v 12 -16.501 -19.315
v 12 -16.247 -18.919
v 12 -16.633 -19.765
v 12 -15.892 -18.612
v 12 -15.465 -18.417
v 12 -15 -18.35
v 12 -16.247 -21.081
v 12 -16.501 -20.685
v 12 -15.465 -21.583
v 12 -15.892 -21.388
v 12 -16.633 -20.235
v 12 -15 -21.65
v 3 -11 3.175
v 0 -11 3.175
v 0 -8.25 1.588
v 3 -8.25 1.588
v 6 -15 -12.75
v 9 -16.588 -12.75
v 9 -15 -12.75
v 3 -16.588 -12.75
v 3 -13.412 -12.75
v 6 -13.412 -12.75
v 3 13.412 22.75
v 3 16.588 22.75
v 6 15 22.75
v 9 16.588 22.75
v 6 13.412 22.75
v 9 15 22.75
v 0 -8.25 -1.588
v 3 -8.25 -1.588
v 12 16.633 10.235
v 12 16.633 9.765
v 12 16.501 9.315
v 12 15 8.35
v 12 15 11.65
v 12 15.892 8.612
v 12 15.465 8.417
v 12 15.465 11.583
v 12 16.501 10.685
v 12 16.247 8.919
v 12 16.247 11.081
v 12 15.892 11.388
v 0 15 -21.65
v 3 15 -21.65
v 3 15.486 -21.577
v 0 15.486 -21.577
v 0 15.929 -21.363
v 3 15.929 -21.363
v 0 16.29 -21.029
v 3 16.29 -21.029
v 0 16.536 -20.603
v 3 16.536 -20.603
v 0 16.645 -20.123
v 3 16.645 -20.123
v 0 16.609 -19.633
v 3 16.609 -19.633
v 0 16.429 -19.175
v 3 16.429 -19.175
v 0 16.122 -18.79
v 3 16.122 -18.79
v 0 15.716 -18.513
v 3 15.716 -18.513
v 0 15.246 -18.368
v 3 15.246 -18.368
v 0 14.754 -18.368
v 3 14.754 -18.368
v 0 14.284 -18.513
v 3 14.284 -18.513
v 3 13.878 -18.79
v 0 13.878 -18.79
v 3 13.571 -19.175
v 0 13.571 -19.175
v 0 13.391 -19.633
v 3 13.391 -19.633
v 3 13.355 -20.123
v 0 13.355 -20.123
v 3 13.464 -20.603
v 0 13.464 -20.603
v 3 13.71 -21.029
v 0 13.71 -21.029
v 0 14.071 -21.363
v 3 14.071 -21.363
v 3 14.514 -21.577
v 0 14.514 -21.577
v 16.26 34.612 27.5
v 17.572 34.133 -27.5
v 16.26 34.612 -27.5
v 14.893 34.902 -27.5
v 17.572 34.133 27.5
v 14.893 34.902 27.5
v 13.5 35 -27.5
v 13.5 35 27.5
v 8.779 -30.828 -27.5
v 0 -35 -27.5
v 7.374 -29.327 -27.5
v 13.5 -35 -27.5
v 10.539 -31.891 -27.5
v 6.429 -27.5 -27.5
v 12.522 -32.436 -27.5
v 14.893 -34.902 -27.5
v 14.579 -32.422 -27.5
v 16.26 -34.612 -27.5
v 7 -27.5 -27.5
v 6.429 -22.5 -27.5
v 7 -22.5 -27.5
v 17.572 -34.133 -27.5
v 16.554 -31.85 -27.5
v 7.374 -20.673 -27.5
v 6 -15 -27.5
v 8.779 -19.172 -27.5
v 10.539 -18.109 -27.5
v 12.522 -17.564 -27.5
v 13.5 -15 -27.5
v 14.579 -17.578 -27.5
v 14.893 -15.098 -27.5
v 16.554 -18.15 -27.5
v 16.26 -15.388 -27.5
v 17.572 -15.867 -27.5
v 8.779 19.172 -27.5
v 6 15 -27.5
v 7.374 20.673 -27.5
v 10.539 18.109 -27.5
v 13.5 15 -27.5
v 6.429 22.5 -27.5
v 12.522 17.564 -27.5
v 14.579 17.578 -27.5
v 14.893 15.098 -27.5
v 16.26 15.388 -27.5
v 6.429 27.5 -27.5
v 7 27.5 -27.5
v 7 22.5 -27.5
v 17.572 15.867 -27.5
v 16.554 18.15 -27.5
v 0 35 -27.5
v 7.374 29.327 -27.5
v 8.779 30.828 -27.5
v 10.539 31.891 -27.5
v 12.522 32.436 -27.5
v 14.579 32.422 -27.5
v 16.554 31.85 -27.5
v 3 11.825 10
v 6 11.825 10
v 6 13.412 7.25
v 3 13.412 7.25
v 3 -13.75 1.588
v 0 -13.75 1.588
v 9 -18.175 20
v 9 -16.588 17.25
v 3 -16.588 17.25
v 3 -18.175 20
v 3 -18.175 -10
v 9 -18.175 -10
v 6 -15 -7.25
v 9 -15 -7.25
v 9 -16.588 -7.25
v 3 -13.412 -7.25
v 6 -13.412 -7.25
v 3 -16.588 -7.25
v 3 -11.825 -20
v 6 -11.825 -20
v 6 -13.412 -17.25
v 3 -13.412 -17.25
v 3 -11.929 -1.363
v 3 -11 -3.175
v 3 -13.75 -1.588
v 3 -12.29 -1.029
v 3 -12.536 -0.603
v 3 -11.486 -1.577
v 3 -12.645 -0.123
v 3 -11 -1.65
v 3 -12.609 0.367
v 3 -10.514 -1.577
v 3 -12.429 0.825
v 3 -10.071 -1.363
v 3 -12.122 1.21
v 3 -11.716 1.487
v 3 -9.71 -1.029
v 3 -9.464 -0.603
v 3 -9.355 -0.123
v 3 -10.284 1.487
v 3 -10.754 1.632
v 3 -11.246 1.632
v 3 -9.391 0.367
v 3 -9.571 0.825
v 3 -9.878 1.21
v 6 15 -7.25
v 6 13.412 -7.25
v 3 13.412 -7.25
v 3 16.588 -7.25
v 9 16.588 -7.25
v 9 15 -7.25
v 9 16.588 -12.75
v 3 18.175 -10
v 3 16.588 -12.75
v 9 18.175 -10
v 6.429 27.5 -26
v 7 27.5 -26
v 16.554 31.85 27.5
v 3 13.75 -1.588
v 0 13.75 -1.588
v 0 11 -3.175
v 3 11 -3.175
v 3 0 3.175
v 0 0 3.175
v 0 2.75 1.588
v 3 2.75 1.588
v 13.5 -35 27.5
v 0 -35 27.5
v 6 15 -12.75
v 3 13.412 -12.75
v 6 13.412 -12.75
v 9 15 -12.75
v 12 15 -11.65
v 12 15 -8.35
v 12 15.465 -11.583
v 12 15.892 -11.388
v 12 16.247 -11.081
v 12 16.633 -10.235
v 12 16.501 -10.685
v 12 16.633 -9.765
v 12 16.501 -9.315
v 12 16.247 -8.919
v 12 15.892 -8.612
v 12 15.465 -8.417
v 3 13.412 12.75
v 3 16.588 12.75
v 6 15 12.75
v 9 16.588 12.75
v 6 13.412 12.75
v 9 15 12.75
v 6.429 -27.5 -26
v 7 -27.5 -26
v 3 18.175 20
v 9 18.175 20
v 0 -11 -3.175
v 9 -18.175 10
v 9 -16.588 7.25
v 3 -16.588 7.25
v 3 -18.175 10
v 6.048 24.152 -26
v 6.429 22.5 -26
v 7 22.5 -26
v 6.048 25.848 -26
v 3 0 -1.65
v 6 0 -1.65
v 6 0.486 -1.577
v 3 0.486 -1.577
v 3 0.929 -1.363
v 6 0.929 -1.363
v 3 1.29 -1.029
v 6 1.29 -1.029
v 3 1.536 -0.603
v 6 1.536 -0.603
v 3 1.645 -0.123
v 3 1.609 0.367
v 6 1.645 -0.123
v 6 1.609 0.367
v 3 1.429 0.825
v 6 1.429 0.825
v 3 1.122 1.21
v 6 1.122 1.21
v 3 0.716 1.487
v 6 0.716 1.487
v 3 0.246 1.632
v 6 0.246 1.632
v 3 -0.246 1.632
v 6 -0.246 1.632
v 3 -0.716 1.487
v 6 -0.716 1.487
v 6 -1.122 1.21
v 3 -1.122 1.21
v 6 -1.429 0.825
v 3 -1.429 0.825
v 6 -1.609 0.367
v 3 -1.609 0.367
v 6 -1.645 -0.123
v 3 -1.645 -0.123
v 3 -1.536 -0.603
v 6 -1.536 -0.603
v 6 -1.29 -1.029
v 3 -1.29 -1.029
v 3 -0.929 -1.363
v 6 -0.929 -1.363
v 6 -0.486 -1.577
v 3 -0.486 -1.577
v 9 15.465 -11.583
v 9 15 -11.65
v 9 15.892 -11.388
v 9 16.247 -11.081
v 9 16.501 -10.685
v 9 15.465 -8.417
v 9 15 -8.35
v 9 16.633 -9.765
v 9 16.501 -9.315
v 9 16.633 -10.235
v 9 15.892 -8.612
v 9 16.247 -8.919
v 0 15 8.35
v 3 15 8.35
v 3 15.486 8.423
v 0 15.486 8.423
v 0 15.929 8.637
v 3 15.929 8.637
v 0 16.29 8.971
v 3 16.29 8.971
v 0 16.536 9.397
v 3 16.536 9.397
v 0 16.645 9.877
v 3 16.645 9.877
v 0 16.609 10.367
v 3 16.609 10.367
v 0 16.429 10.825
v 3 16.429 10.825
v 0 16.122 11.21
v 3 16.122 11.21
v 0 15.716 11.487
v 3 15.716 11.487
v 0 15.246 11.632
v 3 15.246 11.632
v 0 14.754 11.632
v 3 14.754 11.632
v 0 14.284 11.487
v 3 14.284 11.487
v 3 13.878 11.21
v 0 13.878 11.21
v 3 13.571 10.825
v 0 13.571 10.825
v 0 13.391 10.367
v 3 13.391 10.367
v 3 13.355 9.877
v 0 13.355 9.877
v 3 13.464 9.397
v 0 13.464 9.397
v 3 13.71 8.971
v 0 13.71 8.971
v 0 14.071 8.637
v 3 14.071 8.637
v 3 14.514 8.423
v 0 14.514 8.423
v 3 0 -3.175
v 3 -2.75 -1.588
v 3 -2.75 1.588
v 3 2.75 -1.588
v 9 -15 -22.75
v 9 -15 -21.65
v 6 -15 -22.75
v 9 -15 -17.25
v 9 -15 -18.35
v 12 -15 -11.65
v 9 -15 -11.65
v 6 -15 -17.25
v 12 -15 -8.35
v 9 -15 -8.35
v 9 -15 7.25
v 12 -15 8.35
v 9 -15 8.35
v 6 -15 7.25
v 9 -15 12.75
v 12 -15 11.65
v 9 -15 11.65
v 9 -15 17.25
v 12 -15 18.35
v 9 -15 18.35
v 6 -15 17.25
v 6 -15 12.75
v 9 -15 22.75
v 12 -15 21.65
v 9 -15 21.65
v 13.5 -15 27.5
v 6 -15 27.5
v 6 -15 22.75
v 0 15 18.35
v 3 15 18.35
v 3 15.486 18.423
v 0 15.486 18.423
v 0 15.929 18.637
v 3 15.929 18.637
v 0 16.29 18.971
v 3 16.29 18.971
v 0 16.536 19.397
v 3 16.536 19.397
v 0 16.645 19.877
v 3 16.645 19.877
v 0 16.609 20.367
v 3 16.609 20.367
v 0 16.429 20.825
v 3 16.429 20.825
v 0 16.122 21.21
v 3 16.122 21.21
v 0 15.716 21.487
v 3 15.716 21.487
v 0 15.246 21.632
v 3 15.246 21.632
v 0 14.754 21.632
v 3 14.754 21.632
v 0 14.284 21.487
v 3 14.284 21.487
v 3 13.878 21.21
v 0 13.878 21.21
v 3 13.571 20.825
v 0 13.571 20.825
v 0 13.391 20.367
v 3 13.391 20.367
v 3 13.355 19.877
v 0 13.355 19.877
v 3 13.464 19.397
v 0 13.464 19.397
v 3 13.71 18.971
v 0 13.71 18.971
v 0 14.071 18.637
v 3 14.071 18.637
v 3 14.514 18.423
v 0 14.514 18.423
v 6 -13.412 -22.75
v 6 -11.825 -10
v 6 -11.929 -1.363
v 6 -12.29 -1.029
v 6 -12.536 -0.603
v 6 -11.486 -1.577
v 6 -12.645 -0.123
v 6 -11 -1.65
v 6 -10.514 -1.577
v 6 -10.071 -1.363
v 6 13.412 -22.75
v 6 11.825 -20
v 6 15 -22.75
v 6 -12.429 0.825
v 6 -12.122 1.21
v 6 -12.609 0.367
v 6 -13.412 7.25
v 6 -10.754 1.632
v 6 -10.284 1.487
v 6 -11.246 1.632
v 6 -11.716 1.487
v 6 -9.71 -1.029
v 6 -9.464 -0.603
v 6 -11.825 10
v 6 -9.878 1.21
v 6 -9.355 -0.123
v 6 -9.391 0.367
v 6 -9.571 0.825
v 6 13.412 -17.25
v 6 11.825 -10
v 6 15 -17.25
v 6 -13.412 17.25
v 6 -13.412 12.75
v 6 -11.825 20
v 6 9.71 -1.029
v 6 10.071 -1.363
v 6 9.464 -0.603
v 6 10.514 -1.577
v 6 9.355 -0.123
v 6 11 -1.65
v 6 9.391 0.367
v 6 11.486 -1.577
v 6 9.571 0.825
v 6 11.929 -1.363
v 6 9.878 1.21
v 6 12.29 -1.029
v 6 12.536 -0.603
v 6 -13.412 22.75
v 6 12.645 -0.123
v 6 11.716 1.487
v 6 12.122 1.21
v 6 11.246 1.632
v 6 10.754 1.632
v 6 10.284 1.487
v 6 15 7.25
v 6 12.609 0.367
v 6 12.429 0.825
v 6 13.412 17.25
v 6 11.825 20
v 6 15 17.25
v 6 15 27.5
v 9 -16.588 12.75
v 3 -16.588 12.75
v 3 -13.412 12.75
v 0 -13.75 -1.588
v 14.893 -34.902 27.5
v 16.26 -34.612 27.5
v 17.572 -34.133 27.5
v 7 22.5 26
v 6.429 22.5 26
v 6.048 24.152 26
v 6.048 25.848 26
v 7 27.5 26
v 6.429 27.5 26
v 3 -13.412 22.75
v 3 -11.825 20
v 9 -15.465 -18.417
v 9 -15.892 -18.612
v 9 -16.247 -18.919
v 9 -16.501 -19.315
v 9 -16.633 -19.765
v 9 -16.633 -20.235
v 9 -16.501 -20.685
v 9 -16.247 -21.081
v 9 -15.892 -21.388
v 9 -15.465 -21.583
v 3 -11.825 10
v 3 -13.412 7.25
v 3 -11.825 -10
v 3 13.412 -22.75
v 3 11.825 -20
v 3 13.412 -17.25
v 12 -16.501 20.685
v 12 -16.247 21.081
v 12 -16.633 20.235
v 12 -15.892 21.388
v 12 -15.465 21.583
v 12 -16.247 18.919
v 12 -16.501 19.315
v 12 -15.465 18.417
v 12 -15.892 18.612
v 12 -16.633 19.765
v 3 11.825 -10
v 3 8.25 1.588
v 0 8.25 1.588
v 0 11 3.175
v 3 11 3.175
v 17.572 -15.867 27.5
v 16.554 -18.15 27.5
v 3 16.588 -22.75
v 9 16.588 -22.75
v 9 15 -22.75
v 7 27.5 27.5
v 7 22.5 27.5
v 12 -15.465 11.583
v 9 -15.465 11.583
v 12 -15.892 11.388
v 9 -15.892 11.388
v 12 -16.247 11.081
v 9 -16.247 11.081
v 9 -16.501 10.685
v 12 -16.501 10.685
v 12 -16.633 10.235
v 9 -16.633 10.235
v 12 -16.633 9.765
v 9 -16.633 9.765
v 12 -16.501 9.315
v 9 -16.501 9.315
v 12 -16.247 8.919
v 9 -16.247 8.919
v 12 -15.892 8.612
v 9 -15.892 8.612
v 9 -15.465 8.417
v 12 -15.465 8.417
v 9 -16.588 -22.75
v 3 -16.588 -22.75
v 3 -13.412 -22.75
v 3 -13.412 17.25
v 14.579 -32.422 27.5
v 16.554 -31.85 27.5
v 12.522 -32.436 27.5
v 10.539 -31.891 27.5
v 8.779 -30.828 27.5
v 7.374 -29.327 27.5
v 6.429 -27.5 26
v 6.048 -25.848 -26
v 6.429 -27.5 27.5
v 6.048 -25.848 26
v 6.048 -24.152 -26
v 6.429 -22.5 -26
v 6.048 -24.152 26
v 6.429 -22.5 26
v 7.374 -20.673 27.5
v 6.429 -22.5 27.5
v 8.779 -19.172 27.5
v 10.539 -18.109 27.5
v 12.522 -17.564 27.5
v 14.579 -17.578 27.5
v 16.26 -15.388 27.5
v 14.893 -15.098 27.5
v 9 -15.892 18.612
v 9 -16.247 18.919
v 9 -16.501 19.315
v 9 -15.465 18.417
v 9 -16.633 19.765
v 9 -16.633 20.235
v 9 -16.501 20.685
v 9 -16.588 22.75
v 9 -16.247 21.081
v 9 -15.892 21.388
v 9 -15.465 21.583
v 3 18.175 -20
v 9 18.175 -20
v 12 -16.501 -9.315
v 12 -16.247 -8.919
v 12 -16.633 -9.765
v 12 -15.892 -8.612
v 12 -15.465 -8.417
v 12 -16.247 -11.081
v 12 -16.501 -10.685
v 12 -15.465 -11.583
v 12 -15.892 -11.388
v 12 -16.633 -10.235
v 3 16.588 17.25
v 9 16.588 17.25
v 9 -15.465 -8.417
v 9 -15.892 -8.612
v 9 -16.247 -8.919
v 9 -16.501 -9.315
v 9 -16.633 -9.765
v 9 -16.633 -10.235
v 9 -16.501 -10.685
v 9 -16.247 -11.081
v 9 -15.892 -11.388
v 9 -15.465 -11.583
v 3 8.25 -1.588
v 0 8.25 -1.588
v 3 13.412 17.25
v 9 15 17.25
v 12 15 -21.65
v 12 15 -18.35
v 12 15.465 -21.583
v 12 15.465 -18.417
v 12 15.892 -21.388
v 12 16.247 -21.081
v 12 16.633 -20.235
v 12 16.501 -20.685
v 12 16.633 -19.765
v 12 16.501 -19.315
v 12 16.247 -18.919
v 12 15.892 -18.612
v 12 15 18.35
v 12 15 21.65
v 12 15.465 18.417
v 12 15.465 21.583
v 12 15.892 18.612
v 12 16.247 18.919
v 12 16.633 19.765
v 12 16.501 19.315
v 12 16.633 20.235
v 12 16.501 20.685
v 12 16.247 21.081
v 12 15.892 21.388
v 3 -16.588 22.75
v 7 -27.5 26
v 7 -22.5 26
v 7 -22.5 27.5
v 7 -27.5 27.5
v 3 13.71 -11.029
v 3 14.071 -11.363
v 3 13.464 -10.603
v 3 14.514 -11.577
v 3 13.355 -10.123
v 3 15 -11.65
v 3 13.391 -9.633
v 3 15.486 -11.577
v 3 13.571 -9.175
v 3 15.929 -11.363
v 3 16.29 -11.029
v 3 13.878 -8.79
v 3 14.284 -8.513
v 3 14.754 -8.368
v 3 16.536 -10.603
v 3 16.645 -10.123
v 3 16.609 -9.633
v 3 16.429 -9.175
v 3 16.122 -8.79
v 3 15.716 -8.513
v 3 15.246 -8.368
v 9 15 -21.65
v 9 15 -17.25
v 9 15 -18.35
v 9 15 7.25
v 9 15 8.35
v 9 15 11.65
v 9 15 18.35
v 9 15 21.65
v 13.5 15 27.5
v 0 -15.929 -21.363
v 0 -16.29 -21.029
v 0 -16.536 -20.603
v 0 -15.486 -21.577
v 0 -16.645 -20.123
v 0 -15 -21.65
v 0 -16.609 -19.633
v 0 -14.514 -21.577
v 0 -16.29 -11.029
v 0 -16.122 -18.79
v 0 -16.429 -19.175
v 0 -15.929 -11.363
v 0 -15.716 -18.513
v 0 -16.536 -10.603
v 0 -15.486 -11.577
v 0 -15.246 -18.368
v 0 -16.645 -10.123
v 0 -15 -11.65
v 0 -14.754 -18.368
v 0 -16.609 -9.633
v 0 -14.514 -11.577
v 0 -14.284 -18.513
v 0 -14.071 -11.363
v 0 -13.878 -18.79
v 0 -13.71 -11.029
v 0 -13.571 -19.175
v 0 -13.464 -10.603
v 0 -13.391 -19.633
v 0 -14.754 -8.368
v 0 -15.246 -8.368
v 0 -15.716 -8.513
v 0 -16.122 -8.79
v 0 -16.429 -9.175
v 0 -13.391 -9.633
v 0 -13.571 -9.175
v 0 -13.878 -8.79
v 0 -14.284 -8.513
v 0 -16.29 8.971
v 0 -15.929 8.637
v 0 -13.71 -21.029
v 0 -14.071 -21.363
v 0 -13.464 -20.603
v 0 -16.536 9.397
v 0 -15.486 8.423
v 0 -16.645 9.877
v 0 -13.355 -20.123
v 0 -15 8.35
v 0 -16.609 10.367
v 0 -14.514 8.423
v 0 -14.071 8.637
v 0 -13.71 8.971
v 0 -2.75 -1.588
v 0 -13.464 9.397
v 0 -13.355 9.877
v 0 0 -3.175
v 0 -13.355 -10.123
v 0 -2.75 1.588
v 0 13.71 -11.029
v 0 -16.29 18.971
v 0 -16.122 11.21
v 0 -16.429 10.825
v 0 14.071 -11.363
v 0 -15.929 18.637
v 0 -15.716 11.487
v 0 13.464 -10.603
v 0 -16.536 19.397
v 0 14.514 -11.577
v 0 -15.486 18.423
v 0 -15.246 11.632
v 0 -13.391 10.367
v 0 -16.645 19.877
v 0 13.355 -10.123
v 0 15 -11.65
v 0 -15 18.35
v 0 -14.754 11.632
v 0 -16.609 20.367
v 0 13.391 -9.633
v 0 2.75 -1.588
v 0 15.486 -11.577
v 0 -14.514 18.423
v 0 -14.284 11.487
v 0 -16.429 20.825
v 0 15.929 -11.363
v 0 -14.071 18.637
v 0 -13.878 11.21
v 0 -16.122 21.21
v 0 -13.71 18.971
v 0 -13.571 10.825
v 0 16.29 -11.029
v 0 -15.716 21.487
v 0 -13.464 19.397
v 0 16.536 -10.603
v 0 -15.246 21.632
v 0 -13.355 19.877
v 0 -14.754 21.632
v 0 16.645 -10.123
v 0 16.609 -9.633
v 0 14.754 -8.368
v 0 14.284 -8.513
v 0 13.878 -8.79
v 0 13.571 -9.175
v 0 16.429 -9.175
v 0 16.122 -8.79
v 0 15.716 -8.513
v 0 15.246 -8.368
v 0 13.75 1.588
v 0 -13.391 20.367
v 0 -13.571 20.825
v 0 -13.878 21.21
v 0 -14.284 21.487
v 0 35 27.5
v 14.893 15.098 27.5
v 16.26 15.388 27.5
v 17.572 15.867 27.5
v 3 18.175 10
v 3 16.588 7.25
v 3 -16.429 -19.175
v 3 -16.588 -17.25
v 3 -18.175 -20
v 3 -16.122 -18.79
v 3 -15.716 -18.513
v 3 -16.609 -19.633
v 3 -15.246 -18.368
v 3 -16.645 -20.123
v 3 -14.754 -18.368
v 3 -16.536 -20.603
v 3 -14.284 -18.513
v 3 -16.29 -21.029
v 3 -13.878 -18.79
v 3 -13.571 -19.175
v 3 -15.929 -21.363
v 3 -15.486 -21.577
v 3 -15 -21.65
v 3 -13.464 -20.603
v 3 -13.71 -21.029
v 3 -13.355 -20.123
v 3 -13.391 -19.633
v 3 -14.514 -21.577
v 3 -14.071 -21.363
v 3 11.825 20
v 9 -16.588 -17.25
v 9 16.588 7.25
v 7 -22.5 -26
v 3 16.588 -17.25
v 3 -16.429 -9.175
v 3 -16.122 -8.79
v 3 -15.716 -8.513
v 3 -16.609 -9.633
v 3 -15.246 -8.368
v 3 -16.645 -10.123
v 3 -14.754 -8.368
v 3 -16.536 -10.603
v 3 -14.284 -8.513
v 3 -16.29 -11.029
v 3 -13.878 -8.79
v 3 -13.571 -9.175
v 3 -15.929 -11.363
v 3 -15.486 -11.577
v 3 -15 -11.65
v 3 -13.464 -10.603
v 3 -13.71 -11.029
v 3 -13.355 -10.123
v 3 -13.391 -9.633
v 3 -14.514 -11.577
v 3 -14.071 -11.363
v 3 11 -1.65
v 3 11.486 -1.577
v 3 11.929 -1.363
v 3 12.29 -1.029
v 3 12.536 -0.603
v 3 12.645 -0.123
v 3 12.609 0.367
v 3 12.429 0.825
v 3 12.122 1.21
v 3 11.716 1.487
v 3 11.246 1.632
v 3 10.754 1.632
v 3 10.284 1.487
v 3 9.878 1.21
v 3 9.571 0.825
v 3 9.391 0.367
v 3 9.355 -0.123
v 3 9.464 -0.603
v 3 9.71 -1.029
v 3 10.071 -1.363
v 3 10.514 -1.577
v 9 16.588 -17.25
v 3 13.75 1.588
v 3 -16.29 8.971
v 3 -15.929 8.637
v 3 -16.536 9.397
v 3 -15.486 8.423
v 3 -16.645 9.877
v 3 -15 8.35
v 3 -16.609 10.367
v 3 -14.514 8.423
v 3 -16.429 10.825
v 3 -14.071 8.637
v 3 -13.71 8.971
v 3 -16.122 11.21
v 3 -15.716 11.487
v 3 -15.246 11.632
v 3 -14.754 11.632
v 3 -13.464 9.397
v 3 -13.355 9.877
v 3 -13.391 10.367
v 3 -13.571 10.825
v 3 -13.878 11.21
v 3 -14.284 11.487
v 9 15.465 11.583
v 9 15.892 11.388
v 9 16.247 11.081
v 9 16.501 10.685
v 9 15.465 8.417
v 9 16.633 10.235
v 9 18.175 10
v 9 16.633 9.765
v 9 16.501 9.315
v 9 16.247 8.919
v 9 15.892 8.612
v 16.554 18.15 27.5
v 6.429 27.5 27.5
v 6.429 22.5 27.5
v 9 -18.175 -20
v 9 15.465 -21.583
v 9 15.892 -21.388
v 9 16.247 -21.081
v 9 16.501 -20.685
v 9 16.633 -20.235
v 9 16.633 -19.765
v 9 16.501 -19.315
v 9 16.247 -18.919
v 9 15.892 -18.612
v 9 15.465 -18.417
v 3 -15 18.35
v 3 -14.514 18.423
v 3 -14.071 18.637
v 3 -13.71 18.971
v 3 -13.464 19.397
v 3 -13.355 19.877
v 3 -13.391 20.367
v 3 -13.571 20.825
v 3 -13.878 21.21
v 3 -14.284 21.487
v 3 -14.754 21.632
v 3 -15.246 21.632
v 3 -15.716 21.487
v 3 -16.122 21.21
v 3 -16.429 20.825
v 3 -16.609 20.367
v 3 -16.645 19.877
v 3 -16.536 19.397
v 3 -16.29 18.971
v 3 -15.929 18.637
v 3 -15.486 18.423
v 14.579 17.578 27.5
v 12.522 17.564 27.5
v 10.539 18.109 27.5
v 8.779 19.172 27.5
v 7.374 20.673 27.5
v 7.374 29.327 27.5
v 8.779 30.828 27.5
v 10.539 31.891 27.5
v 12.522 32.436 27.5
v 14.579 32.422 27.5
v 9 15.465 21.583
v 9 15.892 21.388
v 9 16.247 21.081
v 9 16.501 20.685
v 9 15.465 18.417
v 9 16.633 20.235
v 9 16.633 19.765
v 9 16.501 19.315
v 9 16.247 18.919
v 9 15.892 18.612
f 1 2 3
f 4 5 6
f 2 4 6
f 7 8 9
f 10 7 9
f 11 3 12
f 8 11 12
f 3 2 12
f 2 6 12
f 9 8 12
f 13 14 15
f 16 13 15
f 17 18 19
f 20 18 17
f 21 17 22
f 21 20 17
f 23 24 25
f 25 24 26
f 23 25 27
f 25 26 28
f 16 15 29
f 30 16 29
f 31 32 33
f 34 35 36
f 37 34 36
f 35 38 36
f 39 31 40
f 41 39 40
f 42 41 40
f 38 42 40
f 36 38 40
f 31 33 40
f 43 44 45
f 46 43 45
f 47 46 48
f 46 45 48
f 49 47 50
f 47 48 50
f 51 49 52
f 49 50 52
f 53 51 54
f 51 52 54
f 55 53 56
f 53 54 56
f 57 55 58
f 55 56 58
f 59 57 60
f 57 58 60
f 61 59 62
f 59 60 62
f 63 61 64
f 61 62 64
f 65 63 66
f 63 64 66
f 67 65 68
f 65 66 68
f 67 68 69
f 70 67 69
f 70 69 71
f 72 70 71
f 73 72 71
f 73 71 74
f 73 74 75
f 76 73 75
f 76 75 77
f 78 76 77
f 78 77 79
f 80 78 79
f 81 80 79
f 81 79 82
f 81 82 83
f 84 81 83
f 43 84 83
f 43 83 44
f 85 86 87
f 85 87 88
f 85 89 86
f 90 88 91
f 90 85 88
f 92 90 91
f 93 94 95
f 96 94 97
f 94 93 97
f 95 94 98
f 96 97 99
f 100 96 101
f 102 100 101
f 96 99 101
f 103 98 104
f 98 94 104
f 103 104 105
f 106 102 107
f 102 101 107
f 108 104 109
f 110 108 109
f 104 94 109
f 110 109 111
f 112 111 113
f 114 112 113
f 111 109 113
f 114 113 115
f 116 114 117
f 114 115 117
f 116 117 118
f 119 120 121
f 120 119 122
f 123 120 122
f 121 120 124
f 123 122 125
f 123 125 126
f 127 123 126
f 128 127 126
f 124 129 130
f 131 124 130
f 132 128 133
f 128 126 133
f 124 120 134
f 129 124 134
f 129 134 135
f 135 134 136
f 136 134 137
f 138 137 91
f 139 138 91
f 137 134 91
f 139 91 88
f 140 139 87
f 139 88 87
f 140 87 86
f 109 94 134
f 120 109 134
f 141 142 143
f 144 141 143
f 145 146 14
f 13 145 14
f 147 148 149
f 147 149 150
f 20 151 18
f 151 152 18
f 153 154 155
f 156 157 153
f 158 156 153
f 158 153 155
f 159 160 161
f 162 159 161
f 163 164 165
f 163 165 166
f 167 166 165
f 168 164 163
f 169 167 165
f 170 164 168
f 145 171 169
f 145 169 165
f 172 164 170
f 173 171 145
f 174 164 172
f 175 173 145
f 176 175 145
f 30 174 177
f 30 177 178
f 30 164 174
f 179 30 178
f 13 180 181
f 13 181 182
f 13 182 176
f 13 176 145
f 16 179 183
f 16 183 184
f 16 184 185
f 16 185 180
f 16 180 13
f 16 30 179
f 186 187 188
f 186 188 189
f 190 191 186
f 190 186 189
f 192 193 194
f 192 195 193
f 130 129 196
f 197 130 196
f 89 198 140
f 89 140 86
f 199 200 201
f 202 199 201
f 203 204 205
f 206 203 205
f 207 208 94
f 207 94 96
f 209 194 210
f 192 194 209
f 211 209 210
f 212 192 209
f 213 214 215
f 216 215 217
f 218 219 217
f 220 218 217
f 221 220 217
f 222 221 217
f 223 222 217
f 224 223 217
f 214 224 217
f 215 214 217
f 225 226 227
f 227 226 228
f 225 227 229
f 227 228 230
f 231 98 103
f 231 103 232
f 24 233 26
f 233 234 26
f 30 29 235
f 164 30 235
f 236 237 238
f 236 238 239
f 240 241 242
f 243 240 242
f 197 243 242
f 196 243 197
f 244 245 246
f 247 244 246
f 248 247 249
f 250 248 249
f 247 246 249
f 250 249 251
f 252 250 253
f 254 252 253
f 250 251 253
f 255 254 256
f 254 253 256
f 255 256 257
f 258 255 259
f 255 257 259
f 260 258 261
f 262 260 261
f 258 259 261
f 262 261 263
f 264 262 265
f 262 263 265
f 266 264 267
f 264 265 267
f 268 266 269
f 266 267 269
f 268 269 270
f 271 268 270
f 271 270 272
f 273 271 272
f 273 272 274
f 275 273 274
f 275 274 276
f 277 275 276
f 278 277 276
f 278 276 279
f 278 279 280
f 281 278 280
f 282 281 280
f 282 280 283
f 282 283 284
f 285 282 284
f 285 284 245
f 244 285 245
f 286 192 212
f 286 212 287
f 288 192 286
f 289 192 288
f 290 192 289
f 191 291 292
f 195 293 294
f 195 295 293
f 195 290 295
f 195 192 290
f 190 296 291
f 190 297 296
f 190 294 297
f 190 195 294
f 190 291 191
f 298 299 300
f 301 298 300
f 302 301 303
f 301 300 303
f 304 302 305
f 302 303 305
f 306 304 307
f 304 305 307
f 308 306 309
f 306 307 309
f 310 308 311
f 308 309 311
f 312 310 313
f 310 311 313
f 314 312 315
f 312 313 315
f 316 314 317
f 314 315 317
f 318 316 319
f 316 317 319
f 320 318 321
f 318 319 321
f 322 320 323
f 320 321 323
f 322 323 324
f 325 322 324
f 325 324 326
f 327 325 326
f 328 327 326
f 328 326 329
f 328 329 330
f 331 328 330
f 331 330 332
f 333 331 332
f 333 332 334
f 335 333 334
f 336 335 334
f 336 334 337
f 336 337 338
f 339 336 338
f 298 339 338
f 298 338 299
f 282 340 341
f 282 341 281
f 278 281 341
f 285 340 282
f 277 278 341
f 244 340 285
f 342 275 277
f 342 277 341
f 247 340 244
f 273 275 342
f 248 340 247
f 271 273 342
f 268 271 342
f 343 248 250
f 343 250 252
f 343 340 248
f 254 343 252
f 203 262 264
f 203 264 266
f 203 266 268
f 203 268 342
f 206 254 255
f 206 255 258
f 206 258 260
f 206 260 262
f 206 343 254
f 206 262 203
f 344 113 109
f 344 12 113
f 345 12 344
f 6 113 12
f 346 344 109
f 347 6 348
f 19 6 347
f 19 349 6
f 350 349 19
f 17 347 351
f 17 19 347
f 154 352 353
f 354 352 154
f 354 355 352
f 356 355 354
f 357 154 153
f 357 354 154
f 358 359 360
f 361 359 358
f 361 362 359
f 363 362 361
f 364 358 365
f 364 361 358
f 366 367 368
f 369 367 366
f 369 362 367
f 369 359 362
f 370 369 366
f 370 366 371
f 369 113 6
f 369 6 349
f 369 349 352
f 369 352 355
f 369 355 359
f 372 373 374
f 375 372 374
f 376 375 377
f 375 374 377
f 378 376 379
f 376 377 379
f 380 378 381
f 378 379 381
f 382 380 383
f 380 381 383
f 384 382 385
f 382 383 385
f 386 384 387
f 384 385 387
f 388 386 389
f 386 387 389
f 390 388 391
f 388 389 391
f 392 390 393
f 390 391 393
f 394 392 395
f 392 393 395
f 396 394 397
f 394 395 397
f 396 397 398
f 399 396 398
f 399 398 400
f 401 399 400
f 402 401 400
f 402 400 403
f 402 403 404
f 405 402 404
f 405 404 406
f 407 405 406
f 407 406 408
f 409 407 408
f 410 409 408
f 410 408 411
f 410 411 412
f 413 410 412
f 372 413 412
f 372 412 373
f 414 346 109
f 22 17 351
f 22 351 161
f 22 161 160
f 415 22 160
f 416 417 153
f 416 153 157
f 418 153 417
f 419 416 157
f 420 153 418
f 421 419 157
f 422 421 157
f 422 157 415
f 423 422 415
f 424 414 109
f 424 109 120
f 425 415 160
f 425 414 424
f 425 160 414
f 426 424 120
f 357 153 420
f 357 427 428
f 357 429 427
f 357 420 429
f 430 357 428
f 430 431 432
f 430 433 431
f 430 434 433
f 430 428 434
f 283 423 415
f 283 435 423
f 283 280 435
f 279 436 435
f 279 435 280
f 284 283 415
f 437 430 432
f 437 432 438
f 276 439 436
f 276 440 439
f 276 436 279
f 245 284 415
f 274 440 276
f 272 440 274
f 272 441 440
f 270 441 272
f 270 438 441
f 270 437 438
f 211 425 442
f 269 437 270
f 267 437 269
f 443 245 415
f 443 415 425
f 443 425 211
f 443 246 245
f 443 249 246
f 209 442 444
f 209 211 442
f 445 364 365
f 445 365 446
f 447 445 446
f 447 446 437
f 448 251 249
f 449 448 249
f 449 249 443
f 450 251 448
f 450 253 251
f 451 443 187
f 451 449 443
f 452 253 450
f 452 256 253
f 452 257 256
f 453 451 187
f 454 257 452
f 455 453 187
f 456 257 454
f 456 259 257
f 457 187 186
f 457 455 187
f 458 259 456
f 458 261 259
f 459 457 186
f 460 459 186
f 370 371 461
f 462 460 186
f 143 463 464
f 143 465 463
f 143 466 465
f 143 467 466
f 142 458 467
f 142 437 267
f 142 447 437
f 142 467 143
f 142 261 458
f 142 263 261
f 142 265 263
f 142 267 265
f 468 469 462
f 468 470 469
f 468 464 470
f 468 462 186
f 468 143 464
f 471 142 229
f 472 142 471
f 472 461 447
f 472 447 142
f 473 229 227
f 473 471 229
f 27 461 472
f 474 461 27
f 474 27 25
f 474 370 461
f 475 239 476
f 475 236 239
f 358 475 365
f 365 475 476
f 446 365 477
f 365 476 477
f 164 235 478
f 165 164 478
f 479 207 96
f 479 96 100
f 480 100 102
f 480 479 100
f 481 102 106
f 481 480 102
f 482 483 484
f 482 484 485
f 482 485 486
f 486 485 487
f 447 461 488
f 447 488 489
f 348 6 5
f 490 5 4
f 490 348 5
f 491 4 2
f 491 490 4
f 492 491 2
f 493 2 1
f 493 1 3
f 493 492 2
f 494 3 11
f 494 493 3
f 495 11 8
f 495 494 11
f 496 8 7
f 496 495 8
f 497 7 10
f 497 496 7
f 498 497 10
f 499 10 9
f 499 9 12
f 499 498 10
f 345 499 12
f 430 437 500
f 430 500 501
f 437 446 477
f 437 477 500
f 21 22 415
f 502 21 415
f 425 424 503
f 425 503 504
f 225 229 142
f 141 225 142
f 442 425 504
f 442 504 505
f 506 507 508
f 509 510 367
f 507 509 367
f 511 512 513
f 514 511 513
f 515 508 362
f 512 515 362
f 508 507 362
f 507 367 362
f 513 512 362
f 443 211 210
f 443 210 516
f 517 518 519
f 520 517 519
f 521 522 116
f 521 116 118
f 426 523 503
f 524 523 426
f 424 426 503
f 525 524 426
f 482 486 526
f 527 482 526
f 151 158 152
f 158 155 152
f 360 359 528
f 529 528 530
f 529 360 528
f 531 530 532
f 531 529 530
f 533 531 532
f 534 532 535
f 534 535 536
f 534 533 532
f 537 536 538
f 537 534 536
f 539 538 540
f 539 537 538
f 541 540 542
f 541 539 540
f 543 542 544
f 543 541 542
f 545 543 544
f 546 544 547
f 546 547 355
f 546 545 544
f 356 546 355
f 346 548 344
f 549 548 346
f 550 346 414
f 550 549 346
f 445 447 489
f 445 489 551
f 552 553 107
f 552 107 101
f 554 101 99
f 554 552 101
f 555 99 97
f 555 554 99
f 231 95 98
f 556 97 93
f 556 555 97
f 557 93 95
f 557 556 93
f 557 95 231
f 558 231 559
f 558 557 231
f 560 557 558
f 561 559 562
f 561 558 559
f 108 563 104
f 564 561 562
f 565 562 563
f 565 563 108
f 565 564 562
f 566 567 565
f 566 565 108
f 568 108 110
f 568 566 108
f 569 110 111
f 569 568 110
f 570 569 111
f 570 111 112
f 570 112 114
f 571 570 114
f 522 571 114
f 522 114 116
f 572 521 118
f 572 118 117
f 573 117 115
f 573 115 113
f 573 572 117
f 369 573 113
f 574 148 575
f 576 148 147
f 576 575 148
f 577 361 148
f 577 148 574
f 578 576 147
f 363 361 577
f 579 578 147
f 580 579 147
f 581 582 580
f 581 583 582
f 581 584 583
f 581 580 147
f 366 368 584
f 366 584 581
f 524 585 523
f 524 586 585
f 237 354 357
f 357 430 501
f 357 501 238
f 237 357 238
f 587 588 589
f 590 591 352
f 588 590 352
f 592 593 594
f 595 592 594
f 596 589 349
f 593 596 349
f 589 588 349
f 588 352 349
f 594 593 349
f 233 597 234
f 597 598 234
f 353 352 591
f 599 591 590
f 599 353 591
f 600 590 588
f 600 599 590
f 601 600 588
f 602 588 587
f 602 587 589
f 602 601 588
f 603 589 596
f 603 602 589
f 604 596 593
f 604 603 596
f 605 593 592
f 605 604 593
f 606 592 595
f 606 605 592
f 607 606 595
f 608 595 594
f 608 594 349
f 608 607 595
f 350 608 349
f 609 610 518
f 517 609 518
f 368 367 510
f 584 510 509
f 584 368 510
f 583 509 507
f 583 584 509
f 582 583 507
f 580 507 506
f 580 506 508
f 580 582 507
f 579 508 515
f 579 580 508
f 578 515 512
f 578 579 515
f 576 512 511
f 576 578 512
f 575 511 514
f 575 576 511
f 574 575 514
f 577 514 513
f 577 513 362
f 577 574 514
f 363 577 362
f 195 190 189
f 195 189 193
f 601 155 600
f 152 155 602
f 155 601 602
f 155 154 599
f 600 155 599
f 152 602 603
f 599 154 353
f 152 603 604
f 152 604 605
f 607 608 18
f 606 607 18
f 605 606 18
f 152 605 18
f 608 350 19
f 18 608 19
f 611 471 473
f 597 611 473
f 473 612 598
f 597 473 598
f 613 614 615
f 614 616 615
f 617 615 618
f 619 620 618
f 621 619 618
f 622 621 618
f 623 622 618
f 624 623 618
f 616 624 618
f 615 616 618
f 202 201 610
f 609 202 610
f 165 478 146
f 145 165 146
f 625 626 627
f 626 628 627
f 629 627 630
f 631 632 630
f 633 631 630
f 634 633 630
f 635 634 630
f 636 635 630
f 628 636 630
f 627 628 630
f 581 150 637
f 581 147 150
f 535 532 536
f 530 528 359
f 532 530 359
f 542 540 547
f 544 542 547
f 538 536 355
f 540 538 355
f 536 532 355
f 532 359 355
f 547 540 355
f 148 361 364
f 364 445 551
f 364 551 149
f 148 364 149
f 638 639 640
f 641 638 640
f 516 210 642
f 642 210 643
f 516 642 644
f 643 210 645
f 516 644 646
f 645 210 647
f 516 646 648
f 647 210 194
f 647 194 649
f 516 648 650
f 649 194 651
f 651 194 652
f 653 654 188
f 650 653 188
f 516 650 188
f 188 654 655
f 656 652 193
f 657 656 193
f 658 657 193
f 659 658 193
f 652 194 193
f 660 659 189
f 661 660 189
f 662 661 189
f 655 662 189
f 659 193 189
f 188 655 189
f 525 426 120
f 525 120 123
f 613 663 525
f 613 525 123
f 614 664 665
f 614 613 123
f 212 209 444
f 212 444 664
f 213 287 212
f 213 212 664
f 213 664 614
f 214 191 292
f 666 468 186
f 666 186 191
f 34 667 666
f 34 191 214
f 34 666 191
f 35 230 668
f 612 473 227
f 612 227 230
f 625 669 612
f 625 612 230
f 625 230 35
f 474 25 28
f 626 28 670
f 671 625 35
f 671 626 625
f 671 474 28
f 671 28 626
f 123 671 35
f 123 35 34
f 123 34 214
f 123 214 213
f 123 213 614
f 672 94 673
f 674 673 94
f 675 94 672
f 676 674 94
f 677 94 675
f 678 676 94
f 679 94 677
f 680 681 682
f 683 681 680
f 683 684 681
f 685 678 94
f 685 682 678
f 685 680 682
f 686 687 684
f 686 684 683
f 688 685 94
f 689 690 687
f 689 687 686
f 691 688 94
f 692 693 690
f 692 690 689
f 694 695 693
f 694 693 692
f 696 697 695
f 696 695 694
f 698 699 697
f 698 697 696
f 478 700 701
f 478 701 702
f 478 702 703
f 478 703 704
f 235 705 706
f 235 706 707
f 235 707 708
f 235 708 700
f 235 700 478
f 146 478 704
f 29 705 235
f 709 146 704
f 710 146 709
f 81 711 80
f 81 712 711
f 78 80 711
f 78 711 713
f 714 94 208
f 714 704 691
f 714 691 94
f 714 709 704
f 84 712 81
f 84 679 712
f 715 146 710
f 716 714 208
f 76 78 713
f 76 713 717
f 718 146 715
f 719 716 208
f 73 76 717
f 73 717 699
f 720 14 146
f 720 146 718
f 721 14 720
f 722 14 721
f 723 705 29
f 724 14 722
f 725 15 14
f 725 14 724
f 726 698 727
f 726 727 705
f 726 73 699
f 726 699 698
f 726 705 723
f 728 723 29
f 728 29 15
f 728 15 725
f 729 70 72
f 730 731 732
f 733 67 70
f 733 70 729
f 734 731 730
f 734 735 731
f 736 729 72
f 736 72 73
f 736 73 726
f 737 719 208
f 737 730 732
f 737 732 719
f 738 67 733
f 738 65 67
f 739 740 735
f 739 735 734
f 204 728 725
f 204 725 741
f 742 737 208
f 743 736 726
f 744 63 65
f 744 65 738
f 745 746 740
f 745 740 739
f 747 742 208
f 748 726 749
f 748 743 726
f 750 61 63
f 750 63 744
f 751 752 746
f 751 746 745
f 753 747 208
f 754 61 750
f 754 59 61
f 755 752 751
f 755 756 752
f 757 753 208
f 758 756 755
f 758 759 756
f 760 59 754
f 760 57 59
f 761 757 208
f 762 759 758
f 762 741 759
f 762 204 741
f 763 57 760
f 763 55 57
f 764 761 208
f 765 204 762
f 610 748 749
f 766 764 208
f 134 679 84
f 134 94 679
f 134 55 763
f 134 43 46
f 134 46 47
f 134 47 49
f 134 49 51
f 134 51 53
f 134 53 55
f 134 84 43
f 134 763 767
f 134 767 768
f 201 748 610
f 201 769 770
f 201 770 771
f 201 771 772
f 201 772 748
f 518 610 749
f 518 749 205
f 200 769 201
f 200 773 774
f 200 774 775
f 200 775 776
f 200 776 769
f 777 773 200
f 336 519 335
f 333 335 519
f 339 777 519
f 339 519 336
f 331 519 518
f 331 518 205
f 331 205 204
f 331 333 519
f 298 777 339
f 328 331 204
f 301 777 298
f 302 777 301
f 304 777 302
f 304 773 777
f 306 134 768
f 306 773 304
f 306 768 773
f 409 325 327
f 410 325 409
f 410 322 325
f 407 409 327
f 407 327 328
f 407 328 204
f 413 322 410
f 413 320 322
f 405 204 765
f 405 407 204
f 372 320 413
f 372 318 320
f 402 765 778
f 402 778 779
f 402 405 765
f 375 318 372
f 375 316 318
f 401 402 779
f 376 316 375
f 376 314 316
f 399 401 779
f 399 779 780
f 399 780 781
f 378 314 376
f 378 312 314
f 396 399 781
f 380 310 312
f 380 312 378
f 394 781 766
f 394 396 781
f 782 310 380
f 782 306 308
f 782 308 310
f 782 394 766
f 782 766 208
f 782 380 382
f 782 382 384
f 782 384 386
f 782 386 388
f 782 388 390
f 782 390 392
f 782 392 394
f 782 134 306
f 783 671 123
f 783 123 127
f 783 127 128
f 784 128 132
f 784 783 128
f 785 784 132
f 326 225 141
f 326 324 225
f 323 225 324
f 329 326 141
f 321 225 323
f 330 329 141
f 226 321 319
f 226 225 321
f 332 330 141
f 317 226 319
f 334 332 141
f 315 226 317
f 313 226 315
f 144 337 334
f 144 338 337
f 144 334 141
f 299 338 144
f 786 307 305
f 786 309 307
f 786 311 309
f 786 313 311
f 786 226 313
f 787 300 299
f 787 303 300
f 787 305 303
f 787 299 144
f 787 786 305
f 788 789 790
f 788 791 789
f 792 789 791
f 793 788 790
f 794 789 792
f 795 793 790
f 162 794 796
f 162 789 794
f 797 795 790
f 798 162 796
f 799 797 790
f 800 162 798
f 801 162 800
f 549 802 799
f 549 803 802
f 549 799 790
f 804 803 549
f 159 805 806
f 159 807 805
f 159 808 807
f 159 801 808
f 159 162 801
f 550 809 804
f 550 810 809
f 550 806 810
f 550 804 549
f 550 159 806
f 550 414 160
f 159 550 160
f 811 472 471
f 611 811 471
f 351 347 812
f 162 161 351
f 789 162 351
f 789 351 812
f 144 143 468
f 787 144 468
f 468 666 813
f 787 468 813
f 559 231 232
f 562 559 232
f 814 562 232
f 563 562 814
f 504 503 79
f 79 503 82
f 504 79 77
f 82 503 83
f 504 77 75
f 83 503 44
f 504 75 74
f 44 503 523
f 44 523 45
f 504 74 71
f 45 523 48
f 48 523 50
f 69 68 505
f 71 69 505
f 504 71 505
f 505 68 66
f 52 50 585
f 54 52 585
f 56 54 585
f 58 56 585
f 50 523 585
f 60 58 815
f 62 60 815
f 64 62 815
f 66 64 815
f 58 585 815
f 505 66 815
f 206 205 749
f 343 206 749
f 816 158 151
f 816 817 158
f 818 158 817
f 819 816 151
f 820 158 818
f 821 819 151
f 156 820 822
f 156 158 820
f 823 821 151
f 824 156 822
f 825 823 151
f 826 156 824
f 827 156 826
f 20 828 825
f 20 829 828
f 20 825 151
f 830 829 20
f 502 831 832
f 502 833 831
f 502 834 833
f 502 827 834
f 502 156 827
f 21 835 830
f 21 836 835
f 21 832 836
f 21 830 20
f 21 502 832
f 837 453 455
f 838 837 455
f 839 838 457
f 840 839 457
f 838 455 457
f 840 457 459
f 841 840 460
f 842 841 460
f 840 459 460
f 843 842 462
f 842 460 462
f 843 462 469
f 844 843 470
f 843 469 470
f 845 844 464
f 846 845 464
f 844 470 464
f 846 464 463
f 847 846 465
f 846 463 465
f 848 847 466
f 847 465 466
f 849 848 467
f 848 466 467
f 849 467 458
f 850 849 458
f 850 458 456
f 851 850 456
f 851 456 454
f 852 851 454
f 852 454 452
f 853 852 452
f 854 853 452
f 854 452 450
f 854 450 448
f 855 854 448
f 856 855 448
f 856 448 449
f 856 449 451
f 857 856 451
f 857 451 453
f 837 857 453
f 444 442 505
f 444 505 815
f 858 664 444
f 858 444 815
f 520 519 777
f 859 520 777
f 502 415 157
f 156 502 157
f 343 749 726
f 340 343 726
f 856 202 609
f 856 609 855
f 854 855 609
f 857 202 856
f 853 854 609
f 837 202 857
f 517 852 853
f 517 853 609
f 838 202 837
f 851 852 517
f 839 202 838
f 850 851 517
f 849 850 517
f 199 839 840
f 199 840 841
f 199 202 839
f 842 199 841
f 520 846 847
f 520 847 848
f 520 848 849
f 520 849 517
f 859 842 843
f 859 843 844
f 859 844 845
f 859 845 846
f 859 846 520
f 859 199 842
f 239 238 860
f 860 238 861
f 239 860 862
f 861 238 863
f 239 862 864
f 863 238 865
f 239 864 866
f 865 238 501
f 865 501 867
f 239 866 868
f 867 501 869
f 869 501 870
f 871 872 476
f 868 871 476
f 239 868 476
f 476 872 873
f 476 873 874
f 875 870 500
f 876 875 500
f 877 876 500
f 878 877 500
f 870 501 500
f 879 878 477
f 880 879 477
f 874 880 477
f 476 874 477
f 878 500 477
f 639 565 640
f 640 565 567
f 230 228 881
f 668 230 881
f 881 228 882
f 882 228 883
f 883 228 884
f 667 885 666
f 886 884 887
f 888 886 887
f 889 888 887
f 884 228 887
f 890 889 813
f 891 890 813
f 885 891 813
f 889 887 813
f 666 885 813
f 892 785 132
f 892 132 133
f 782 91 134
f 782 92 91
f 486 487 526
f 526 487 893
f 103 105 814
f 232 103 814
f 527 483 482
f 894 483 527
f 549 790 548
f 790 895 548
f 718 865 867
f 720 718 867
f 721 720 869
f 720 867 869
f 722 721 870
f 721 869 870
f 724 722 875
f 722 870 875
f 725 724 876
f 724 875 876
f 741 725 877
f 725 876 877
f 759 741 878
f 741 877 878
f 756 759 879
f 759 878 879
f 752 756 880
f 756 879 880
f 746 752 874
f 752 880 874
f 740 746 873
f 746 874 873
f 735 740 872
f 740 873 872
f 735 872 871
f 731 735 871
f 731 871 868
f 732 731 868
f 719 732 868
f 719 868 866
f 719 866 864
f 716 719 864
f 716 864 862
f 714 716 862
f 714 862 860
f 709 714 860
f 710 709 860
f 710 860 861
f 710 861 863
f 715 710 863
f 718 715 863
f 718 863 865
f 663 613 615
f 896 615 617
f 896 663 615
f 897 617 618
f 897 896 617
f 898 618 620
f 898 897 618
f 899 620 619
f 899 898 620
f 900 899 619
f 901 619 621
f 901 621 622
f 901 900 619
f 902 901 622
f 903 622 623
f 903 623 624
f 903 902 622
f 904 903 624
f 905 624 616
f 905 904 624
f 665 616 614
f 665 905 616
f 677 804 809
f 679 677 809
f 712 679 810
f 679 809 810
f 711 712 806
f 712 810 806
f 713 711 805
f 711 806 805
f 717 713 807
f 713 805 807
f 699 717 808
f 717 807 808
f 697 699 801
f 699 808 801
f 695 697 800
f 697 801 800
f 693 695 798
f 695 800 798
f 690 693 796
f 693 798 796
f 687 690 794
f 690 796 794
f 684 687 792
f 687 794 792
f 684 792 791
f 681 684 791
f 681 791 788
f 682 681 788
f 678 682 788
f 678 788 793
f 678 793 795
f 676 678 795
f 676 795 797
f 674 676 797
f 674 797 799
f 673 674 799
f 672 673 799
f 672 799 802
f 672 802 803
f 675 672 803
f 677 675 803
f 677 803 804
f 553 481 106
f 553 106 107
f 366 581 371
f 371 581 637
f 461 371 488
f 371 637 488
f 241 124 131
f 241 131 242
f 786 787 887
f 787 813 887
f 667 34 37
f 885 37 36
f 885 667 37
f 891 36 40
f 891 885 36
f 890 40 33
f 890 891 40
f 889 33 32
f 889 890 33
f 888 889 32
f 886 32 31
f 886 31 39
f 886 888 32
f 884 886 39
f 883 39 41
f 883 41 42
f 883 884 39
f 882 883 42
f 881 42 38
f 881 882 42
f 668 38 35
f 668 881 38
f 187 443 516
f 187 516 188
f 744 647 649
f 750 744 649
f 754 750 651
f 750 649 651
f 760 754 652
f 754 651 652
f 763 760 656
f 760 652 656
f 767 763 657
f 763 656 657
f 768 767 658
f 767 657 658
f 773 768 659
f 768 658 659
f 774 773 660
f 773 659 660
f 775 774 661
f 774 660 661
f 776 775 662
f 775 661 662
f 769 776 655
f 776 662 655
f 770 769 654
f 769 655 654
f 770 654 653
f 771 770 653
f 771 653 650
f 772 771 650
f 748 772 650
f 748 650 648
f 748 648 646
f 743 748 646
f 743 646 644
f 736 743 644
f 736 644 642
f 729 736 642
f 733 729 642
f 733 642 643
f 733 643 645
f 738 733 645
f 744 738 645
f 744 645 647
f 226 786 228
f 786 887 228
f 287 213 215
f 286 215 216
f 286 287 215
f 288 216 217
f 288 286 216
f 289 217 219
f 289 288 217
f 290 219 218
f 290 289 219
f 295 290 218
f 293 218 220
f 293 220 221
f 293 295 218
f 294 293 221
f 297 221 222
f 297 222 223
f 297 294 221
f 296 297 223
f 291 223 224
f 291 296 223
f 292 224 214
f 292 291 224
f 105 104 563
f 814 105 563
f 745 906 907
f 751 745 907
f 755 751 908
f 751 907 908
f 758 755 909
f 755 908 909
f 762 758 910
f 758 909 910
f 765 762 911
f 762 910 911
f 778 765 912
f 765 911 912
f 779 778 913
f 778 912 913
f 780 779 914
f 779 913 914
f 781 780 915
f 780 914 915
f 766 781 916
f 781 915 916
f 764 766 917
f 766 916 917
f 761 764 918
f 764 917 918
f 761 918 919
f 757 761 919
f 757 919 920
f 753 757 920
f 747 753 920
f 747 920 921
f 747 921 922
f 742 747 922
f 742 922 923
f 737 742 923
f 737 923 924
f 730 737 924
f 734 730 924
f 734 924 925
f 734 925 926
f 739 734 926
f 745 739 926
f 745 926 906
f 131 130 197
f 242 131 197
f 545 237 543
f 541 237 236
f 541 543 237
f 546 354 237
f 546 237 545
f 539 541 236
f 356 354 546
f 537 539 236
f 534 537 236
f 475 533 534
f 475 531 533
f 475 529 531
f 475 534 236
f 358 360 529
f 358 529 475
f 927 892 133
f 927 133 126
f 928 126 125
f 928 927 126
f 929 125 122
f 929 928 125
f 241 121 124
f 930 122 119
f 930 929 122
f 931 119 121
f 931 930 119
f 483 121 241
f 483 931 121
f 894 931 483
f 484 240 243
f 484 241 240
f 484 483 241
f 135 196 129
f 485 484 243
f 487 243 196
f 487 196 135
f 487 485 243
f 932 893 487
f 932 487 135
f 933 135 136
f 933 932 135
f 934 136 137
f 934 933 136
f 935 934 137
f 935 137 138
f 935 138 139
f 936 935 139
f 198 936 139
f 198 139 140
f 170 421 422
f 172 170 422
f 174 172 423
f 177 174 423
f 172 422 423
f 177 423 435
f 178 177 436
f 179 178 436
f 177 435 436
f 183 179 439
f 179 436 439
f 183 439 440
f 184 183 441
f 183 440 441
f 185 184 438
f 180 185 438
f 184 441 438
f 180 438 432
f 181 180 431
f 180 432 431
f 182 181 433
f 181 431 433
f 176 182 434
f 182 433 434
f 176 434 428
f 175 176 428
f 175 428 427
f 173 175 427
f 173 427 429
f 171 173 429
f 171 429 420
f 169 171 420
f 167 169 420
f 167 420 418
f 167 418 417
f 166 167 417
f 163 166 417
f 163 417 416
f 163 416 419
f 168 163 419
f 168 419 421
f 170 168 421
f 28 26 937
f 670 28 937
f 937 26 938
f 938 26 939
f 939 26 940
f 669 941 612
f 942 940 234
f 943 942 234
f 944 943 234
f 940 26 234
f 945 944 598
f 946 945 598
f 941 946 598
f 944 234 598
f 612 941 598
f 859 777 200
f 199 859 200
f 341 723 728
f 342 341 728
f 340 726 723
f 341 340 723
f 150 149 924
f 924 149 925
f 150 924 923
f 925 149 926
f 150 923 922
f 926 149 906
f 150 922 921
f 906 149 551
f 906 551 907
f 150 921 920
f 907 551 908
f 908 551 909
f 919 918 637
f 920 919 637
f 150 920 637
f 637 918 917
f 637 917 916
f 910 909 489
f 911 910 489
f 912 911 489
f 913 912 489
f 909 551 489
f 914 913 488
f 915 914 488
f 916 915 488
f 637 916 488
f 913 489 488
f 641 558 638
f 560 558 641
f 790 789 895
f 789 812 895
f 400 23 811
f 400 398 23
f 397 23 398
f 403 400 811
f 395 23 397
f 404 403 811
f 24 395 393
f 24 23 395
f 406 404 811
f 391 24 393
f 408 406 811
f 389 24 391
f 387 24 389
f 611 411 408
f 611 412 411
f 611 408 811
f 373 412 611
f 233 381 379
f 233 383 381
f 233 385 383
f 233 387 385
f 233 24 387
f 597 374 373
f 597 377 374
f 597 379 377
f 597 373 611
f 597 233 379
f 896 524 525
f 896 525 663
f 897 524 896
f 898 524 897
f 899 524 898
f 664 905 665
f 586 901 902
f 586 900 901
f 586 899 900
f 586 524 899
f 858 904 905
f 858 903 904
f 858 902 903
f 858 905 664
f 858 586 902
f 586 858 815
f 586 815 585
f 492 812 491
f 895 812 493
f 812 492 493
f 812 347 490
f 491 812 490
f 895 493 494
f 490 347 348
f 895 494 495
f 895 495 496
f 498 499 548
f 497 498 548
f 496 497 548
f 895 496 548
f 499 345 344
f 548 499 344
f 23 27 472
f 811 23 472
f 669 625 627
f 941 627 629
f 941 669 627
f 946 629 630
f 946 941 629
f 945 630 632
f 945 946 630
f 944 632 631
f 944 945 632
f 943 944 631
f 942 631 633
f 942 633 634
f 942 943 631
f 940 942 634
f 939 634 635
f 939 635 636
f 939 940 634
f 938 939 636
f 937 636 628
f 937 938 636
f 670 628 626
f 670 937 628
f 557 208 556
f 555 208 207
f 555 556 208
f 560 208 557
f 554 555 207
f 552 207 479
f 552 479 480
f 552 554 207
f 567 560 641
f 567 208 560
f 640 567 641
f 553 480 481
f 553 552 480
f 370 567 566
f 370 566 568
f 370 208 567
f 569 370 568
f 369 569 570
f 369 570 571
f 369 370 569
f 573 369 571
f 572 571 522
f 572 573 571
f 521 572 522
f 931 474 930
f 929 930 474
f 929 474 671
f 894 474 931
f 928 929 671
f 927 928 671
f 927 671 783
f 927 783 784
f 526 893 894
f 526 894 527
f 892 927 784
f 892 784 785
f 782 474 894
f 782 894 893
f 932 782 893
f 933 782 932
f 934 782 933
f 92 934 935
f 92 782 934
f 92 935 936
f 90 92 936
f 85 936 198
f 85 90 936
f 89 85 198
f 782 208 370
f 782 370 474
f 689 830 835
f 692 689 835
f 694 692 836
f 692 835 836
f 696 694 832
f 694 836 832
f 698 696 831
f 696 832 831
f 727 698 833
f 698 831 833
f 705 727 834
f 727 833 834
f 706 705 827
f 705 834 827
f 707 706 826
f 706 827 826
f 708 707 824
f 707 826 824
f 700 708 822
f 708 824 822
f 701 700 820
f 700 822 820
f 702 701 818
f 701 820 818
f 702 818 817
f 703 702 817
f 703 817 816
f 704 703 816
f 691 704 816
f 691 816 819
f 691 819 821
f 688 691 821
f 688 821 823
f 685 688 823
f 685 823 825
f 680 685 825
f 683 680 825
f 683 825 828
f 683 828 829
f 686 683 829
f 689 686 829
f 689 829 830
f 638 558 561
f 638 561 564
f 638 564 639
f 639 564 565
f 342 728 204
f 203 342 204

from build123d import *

# Parameters (mm, degrees)
RESSALTO_EXTRUS_O1_DEPTH   = 27.5
CORTE_EXTRUS_O3_DEPTH      = 6
CORTE_EXTRUS_O3_DEPTH_BACK = 10
ESBO_O6_R                  = 1.65
CORTE_EXTRUS_O4_DEPTH      = 3
CORTE_EXTRUS_O4_DEPTH_BACK = 3
CORTE_EXTRUS_O5_DEPTH      = 3
ESBO_O10_W                 = 1.5
ESBO_O10_H                 = 5
RESSALTO_EXTRUS_O3_DEPTH   = 7


with BuildPart() as part:
    # Esboço1 → Ressalto-extrusão1 (new, symmetric)
    with BuildSketch(Plane.XY):
        with BuildLine():
            Line((0, 35), (0, -35))
            Line((0, -35), (13.5, -35))
            ThreePointArc((13.5, -35), (15.581665999, -34.780933834), (17.572127481, -34.133333333))
            Line((17.572127481, -34.133333333), (16.554095611, -31.85))
            ThreePointArc((16.554095611, -31.85), (6, -25), (16.554095611, -18.15))
            Line((16.554095611, -18.15), (17.572127481, -15.866666667))
            ThreePointArc((17.572127481, -15.866666667), (15.581665999, -15.219066166), (13.5, -15))
            Line((13.5, -15), (6, -15))
            Line((6, -15), (6, 15))
            Line((6, 15), (13.5, 15))
            ThreePointArc((13.5, 15), (15.581665999, 15.219066166), (17.572127481, 15.866666667))
            Line((17.572127481, 15.866666667), (16.554095611, 18.15))
            ThreePointArc((16.554095611, 18.15), (6, 25), (16.554095611, 31.85))
            Line((16.554095611, 31.85), (17.572127481, 34.133333333))
            ThreePointArc((17.572127481, 34.133333333), (15.581665999, 34.780933834), (13.5, 35))
            Line((13.5, 35), (0, 35))
        make_face()
    extrude(amount=RESSALTO_EXTRUS_O1_DEPTH, both=True)

    # Esboço6 → Corte-extrusão3 (cut, two sides: drawn at the far end of the back side and taken through both)
    with BuildSketch(Plane(origin=(6, 0, 0), x_dir=(0, 0, -1), z_dir=(1, 0, 0)).offset(-CORTE_EXTRUS_O3_DEPTH_BACK)):
        with Locations((-20, 15)):
            Circle(ESBO_O6_R)
        with Locations((20, -15)):
            Circle(ESBO_O6_R)
        with Locations((10, -15)):
            Circle(ESBO_O6_R)
        with Locations((-10, 15)):
            Circle(ESBO_O6_R)
        with Locations((10, 15)):
            Circle(ESBO_O6_R)
        with Locations((20, 15)):
            Circle(ESBO_O6_R)
        with Locations((-10, -15)):
            Circle(ESBO_O6_R)
        with Locations((-20, -15)):
            Circle(ESBO_O6_R)
        with Locations((0, 11)):
            Circle(ESBO_O6_R)
        Circle(ESBO_O6_R)
        with Locations((0, -11)):
            Circle(ESBO_O6_R)
    extrude(amount=CORTE_EXTRUS_O3_DEPTH + CORTE_EXTRUS_O3_DEPTH_BACK, mode=Mode.SUBTRACT)

    # Esboço8 → Corte-extrusão4 (cut, two sides: drawn at the far end of the back side and taken through both)
    with BuildSketch(Plane(origin=(6, 0, 0), x_dir=(0, 0, -1), z_dir=(1, 0, 0)).offset(-CORTE_EXTRUS_O4_DEPTH_BACK)):
        Polygon((-20, 11.824573519), (-17.25, 13.41228676), (-17.25, 16.58771324), (-20, 18.175426481), (-22.75, 16.58771324), (-22.75, 13.41228676), align=None)
        Polygon((-10, 11.824573519), (-7.25, 13.41228676), (-7.25, 16.58771324), (-10, 18.175426481), (-12.75, 16.58771324), (-12.75, 13.41228676), align=None)
        Polygon((-12.75, -13.41228676), (-10, -11.824573519), (-7.25, -13.41228676), (-7.25, -16.58771324), (-10, -18.175426481), (-12.75, -16.58771324), align=None)
        Polygon((-22.75, -13.41228676), (-20, -11.824573519), (-17.25, -13.41228676), (-17.25, -16.58771324), (-20, -18.175426481), (-22.75, -16.58771324), align=None)
        Polygon((20, -11.824573519), (17.25, -13.41228676), (17.25, -16.58771324), (20, -18.175426481), (22.75, -16.58771324), (22.75, -13.41228676), align=None)
        Polygon((10, -11.824573519), (7.25, -13.41228676), (7.25, -16.58771324), (10, -18.175426481), (12.75, -16.58771324), (12.75, -13.41228676), align=None)
        Polygon((12.75, 13.41228676), (10, 11.824573519), (7.25, 13.41228676), (7.25, 16.58771324), (10, 18.175426481), (12.75, 16.58771324), align=None)
        Polygon((22.75, 13.41228676), (20, 11.824573519), (17.25, 13.41228676), (17.25, 16.58771324), (20, 18.175426481), (22.75, 16.58771324), align=None)
    extrude(amount=CORTE_EXTRUS_O4_DEPTH + CORTE_EXTRUS_O4_DEPTH_BACK, mode=Mode.SUBTRACT)

    # Esboço9 → Corte-extrusão5 (cut)
    with BuildSketch(Plane.ZY):
        Polygon((3.175426481, 11), (1.58771324, 13.75), (-1.58771324, 13.75), (-3.175426481, 11), (-1.58771324, 8.25), (1.58771324, 8.25), align=None)
        Polygon((3.175426481, 0), (1.58771324, 2.75), (-1.58771324, 2.75), (-3.175426481, 0), (-1.58771324, -2.75), (1.58771324, -2.75), align=None)
        Polygon((3.175426481, -11), (1.58771324, -8.25), (-1.58771324, -8.25), (-3.175426481, -11), (-1.58771324, -13.75), (1.58771324, -13.75), align=None)
    extrude(amount=-CORTE_EXTRUS_O5_DEPTH, mode=Mode.SUBTRACT)

    # Esboço10 → Ressalto-extrusão3 (add)
    with BuildSketch(Plane.ZY):
        with Locations((-26.75, 25)):
            Rectangle(ESBO_O10_W, ESBO_O10_H)
        with Locations((26.75, 25)):
            Rectangle(ESBO_O10_W, ESBO_O10_H)
        with Locations((26.75, -25)):
            Rectangle(ESBO_O10_W, ESBO_O10_H)
        with Locations((-26.75, -25)):
            Rectangle(ESBO_O10_W, ESBO_O10_H)
    extrude(amount=-RESSALTO_EXTRUS_O3_DEPTH)


solid = part.part
